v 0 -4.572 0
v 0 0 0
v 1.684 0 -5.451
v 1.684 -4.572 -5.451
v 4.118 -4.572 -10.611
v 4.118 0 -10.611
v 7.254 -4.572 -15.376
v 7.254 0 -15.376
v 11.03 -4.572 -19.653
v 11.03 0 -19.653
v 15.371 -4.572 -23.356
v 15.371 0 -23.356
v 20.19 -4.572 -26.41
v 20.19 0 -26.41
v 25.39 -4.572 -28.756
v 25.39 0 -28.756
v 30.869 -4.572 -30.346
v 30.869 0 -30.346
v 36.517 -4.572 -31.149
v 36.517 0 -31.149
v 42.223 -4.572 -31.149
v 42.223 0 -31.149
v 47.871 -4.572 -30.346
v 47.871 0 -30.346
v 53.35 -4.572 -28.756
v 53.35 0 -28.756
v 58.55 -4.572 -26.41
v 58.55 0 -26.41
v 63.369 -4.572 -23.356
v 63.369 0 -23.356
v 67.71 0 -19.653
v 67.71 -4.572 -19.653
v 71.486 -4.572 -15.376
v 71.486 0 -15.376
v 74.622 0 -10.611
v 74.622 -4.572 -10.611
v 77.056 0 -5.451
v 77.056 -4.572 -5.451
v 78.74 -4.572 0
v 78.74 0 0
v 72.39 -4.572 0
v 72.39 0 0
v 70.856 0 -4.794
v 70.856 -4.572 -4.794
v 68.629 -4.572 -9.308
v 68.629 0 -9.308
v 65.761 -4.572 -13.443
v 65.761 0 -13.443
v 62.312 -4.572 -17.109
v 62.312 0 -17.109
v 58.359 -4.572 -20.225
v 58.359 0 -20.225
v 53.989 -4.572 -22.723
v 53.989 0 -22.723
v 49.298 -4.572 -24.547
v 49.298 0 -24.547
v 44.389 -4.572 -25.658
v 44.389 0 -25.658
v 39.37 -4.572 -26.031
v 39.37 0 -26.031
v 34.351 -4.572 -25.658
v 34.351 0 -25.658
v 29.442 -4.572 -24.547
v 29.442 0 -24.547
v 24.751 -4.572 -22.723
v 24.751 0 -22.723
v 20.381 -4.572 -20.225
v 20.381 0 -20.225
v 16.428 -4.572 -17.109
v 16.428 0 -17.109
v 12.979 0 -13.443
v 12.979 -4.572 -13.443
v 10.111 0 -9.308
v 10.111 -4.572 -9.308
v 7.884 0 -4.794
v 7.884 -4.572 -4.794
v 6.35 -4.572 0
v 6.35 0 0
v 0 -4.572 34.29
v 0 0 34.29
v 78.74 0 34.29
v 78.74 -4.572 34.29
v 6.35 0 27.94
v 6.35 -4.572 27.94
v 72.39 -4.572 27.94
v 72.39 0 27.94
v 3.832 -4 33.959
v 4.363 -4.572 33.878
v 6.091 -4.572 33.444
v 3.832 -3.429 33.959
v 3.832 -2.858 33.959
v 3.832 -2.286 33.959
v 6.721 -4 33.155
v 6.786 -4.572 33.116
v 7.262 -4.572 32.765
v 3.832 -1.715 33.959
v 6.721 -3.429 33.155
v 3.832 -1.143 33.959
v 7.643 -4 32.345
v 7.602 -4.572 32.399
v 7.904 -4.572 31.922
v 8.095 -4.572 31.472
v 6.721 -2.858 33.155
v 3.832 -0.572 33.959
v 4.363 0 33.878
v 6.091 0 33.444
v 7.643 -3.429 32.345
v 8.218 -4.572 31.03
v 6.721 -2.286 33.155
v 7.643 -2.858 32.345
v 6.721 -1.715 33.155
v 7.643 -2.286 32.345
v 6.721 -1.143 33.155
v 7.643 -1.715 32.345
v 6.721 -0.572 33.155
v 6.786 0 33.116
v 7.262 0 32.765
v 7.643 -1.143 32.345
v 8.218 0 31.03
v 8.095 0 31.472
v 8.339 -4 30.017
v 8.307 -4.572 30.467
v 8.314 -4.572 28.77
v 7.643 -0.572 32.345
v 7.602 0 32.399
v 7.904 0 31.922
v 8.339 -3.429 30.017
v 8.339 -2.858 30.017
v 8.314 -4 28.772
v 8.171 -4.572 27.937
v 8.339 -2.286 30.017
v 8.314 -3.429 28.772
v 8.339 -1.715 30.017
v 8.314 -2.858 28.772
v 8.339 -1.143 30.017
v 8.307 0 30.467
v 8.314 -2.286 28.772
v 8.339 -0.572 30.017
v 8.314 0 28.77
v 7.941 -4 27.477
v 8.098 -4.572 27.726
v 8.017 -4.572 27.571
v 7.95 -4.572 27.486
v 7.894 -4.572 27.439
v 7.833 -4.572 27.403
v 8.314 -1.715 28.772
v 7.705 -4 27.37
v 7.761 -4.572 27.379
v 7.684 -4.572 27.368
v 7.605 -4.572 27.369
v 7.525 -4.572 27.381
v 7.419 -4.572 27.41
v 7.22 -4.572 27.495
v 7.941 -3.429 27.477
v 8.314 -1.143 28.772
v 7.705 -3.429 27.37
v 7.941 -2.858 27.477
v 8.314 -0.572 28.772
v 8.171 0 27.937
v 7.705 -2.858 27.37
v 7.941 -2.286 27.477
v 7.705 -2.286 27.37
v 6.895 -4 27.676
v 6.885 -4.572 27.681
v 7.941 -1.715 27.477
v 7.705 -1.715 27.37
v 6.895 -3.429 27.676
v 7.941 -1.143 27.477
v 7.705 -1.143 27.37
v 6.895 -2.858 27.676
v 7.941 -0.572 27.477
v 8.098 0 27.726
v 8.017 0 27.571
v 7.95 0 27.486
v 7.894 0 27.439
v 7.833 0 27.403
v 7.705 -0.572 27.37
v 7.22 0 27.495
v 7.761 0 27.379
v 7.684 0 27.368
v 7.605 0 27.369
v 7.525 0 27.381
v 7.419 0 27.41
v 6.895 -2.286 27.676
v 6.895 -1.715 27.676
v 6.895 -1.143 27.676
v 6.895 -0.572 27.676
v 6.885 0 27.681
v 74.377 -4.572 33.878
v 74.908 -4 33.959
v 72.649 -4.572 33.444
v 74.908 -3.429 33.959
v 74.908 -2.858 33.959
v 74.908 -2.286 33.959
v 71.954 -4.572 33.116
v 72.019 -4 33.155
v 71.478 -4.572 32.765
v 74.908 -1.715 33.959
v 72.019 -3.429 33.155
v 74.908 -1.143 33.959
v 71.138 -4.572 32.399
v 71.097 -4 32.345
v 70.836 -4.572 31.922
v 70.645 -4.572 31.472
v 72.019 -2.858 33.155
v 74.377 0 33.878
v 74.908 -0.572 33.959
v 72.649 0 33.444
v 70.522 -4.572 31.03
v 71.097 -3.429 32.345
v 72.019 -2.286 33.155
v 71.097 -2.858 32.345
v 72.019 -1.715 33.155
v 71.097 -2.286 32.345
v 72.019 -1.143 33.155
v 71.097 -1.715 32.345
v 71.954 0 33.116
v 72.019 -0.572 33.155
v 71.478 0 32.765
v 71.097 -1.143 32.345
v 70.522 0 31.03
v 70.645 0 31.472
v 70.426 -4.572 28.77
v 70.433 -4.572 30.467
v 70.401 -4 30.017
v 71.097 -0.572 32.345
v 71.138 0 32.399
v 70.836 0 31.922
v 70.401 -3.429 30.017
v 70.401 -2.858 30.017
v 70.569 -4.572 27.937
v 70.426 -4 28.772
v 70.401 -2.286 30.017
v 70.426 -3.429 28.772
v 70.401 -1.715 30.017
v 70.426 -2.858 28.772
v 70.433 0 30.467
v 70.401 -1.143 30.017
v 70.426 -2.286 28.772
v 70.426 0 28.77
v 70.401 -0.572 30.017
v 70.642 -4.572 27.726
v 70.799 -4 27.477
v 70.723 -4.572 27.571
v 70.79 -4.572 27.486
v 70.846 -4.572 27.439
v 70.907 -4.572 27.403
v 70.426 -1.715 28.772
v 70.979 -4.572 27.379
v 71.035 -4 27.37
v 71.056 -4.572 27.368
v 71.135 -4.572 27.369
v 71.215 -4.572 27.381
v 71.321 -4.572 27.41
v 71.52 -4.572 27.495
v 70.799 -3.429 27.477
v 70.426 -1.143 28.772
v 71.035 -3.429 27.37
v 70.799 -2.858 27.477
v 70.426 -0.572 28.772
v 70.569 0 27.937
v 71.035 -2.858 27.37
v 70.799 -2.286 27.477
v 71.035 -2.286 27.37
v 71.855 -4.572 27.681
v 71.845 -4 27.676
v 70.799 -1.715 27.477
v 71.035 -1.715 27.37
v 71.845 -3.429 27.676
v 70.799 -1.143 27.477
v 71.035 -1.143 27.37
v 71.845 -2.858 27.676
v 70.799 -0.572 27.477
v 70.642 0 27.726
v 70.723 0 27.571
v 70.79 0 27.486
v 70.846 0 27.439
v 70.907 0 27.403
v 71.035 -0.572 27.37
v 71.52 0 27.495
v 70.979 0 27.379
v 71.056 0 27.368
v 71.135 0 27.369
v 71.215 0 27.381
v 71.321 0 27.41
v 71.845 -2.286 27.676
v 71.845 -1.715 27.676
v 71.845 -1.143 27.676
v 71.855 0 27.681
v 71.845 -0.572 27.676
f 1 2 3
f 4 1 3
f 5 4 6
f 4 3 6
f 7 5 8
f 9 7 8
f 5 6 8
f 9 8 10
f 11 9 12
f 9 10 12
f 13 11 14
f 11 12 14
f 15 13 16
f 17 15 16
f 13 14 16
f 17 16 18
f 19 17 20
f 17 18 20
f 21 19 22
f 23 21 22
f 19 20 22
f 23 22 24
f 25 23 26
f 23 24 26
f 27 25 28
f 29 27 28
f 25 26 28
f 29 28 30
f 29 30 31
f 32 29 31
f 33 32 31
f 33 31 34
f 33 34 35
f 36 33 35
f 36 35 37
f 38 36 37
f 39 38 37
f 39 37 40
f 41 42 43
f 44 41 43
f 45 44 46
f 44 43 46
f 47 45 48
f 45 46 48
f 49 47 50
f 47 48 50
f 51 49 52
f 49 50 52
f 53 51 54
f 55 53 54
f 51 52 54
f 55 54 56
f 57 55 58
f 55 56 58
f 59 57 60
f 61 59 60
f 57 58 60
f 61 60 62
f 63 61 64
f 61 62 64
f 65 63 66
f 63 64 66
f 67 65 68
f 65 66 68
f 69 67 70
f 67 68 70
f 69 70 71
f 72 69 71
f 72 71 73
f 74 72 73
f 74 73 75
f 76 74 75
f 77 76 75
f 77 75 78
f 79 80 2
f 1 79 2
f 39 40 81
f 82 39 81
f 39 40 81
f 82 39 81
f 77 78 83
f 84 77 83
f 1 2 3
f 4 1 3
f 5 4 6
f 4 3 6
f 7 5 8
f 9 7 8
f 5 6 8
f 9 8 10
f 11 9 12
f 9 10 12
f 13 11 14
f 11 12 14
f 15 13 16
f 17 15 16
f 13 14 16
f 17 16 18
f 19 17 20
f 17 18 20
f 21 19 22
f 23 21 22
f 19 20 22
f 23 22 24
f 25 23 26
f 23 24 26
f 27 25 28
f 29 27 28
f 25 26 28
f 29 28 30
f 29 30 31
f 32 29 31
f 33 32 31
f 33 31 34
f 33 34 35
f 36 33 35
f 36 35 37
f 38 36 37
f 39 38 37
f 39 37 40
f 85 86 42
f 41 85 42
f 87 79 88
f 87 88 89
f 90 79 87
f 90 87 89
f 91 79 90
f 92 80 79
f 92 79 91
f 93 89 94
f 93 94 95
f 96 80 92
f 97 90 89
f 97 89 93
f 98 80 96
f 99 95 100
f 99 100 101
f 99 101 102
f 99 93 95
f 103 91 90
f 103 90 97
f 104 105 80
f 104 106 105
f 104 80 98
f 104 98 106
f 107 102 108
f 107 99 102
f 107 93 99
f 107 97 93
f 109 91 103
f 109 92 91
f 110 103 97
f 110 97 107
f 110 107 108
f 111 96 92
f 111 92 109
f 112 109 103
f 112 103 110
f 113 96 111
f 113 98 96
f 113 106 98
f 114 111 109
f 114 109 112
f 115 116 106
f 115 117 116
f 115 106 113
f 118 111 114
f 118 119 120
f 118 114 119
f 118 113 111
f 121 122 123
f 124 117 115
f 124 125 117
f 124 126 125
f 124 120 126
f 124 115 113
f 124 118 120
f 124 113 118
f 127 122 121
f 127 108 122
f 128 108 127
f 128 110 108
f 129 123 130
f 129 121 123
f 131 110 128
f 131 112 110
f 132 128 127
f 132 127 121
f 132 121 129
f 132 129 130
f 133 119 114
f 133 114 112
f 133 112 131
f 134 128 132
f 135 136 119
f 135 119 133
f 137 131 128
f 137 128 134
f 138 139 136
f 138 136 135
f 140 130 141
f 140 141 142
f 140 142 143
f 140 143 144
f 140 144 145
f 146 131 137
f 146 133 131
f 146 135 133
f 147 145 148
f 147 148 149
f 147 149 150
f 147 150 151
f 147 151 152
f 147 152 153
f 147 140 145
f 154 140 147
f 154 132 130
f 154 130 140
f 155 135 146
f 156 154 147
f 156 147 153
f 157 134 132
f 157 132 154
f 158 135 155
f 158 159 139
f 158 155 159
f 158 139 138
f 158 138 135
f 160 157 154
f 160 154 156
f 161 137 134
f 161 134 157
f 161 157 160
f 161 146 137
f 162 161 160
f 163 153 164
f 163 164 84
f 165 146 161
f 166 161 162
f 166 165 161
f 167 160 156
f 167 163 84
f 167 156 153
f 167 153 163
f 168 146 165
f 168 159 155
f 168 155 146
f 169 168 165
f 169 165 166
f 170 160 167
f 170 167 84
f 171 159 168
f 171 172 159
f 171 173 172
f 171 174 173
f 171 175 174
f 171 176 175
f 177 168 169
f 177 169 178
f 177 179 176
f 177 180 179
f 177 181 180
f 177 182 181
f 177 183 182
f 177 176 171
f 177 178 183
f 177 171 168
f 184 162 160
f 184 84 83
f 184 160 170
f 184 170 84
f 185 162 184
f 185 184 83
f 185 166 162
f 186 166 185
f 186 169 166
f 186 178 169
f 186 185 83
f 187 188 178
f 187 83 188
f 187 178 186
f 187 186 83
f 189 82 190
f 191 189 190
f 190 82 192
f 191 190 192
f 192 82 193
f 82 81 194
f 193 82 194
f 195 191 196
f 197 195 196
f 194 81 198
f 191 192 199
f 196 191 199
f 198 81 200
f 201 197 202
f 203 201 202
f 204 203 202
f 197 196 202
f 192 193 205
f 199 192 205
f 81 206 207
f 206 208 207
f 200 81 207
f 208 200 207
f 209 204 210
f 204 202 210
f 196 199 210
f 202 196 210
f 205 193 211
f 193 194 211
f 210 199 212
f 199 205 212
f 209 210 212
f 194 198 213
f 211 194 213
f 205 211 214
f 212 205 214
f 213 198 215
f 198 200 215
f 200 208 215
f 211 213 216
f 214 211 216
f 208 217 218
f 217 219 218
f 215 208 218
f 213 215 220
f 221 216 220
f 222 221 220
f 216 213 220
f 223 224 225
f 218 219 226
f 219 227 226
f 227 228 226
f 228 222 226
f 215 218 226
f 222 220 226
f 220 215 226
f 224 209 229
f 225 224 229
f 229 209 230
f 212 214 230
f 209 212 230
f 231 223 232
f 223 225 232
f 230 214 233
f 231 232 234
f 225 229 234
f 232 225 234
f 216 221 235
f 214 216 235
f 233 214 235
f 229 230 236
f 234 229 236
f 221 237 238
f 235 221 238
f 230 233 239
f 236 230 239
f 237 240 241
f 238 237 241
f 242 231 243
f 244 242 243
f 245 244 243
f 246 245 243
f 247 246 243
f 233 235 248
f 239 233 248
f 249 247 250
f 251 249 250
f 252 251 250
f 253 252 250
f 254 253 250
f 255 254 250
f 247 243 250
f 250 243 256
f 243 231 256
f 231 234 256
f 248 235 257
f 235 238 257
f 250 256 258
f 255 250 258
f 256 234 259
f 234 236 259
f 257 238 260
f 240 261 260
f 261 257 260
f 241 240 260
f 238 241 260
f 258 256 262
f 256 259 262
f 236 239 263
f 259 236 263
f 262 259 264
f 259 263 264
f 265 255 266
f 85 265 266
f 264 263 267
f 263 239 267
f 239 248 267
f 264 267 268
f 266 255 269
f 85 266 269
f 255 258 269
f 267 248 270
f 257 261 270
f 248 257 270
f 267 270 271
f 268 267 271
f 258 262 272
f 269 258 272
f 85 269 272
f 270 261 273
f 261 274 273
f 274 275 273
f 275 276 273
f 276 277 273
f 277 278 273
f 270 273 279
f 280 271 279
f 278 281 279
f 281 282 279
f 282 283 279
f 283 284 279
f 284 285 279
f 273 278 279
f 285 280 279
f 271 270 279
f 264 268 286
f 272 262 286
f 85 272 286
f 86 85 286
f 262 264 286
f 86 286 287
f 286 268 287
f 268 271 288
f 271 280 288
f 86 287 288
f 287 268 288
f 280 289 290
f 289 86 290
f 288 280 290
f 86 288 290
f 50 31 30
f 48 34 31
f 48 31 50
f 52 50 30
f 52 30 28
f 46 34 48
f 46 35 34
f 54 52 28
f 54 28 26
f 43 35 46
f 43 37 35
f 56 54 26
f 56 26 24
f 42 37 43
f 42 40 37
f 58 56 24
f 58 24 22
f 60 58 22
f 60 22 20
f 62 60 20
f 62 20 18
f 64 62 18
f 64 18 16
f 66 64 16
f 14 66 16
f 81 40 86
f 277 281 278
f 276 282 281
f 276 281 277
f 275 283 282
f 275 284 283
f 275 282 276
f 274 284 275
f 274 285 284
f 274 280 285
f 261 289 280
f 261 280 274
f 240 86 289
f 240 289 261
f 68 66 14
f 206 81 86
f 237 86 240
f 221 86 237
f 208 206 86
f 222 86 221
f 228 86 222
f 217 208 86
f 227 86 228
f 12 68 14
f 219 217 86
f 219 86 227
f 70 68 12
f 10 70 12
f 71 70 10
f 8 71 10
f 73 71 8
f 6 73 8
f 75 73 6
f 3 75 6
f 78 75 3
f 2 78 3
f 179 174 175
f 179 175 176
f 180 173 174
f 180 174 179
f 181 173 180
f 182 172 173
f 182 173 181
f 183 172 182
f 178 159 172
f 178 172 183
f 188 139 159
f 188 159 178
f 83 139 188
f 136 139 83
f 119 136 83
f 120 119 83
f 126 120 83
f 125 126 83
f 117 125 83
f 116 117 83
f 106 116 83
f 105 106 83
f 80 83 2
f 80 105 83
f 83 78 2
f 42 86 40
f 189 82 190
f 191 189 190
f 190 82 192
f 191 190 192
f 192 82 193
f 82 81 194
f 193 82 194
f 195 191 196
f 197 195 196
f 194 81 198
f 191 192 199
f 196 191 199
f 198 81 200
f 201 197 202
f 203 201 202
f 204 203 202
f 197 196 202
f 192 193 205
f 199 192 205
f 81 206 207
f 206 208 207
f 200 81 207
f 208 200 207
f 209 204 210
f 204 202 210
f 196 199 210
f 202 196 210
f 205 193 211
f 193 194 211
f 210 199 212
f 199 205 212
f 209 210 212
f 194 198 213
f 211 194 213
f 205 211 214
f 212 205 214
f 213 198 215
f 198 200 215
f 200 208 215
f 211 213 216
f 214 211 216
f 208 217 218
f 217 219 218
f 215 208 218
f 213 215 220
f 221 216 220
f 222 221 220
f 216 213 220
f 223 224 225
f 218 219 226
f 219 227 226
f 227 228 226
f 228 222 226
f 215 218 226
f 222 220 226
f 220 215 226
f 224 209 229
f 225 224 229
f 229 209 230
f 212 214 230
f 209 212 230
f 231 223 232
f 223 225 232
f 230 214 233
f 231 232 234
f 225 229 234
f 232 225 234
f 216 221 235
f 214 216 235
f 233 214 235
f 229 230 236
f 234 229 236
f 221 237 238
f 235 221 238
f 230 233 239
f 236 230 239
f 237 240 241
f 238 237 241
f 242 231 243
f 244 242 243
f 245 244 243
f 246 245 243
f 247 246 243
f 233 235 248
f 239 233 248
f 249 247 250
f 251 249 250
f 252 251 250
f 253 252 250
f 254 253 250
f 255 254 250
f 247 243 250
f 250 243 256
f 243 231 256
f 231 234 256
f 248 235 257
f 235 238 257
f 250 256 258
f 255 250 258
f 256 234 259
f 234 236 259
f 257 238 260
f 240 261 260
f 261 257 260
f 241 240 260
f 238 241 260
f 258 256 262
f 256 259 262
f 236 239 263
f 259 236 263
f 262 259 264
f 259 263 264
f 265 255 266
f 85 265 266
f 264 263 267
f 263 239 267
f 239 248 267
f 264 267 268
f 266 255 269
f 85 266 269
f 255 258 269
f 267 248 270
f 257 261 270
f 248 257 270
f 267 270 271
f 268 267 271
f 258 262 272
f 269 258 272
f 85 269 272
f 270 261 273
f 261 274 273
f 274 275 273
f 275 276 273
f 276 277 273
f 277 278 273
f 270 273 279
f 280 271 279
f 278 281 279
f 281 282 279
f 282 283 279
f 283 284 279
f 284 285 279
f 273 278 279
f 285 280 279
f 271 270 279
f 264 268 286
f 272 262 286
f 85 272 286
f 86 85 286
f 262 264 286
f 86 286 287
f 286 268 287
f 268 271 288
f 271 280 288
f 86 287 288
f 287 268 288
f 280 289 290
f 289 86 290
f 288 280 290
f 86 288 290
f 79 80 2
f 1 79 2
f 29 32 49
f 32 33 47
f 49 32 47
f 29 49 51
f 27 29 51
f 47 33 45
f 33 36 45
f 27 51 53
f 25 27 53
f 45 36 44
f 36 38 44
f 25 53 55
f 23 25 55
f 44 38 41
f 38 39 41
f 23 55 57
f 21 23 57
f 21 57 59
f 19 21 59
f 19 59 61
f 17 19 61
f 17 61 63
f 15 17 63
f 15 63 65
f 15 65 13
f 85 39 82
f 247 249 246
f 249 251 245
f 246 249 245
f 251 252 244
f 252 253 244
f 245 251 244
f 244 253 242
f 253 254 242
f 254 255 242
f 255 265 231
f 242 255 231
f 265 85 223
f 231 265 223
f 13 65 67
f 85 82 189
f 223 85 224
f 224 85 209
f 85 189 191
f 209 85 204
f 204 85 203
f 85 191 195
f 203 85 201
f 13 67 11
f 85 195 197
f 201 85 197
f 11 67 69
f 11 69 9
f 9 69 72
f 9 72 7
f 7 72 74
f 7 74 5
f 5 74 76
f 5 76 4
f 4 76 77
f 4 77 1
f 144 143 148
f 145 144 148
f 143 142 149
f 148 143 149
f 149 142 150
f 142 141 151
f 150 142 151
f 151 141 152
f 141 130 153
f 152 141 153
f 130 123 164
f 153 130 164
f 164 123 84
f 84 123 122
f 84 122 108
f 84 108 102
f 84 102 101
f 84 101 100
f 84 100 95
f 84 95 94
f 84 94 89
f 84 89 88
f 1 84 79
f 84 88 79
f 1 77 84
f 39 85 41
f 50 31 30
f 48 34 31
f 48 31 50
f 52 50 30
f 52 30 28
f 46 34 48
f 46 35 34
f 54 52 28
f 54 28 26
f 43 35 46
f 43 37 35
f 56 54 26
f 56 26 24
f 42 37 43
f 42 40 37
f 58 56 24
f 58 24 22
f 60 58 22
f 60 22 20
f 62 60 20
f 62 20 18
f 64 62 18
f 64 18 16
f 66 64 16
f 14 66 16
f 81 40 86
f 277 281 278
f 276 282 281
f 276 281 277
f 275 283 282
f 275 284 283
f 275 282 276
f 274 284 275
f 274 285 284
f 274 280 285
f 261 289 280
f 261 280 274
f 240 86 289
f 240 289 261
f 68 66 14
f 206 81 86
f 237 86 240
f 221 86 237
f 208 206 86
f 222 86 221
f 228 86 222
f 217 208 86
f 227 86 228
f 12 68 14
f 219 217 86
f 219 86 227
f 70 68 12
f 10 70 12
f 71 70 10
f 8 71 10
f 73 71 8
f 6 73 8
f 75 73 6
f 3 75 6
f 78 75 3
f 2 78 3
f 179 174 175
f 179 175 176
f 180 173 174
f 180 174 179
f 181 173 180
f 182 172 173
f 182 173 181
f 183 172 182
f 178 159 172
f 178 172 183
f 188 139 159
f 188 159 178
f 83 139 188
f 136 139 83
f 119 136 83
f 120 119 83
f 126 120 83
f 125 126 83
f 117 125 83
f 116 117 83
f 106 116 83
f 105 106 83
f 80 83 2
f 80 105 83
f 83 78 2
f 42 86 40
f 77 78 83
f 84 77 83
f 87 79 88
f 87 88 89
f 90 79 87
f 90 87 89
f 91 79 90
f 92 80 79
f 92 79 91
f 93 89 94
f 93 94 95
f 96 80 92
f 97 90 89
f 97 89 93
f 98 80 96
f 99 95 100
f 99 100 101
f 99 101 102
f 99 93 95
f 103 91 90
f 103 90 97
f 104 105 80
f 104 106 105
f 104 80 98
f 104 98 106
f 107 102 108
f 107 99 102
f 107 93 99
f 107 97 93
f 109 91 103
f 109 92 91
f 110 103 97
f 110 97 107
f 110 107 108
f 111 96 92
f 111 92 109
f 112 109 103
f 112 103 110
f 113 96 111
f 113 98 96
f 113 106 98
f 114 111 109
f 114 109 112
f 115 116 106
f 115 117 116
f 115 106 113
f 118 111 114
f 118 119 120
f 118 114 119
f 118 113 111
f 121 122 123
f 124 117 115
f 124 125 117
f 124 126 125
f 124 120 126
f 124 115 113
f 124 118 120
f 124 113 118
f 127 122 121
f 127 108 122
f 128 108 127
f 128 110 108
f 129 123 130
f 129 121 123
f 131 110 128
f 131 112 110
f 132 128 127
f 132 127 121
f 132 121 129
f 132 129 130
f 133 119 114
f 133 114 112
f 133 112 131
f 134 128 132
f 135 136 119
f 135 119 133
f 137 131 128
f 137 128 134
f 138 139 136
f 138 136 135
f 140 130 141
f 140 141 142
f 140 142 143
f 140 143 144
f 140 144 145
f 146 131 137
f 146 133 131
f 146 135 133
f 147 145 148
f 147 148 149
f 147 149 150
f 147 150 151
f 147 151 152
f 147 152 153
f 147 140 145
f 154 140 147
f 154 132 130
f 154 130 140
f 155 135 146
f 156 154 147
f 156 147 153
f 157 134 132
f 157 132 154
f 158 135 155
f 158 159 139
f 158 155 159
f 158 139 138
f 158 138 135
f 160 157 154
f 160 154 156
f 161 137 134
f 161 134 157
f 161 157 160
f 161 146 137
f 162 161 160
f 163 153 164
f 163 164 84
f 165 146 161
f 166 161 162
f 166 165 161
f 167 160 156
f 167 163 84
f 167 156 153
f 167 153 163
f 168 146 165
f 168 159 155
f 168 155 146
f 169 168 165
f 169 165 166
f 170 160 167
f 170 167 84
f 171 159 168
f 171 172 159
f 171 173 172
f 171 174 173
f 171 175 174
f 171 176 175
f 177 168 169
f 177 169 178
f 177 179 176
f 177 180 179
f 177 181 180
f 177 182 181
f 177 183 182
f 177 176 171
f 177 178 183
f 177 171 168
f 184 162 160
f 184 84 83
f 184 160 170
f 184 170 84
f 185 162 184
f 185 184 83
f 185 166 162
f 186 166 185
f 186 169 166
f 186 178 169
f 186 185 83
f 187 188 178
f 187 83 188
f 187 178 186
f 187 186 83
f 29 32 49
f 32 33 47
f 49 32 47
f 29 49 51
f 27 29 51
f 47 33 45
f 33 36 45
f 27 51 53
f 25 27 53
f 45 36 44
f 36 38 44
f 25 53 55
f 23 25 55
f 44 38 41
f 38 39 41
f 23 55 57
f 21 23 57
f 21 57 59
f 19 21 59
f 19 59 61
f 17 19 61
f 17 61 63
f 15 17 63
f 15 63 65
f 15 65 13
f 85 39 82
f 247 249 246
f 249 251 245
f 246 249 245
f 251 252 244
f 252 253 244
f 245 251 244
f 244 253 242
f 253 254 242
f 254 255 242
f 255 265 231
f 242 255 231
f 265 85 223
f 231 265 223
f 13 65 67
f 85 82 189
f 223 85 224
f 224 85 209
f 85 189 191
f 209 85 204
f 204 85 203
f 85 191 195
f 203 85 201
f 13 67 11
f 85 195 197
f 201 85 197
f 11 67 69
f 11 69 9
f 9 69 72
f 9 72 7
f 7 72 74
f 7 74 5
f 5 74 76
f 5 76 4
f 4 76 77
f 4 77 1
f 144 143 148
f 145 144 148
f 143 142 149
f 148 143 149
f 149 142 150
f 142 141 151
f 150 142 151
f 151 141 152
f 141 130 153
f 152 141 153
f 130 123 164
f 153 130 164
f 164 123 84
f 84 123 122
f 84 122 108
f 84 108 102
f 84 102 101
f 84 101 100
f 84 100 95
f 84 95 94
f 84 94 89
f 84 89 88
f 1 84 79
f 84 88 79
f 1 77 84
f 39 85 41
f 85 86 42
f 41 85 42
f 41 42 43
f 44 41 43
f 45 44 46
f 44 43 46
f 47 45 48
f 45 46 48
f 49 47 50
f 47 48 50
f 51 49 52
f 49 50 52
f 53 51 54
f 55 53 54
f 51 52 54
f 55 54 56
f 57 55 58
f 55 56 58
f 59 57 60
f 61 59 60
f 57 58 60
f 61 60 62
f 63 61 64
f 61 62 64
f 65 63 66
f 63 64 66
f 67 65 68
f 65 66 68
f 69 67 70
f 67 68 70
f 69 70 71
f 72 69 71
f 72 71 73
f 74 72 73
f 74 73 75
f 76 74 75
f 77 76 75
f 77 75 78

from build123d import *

# Parameters (mm, degrees)
F2_DEPTH = 4.572


with BuildPart() as f2:
    # F0 (on Front) → F2 (new body)
    with BuildSketch(Plane.XZ):
        with BuildLine():
            add(Edge.make_bspline(
                [(0, 34.29), (2.6595032543, 34.1218786327), (6.8410462273, 33.8575410271), (8.2231424457, 31.5056600227), (8.3576780587, 30.0085364948), (8.3617785553, 28.8524886525), (8.106687112, 27.3344007608), (7.4111867176, 27.3555041178), (6.8997891701, 27.6921221538), (6.5329051916, 27.8575353983), (6.35, 27.94)],
                knots=[0, 0, 0, 0, 0.2653006447, 0.4171328029, 0.5379049919, 0.6513099628, 0.7692832851, 0.8413997949, 0.9209319496, 1, 1, 1, 1], degree=3))
            Line((0, 34.29), (0, 0))
            ThreePointArc((0, 0), (39.37, -31.2501201344), (78.74, 0))
            Line((78.74, 0), (78.74, 34.29))
            add(Edge.make_bspline(
                [(78.74, 34.29), (76.0804967457, 34.1218786327), (71.8989537727, 33.8575410271), (70.5168575543, 31.5056600227), (70.3823219413, 30.0085364948), (70.3782214447, 28.8524886525), (70.633312888, 27.3344007608), (71.3288132824, 27.3555041178), (71.8402108299, 27.6921221538), (72.2070948084, 27.8575353983), (72.39, 27.94)],
                knots=[0, 0, 0, 0, 0.2653006447, 0.4171328029, 0.5379049919, 0.6513099628, 0.7692832851, 0.8413997949, 0.9209319496, 1, 1, 1, 1], degree=3))
            Line((72.39, 27.94), (72.39, 0))
            ThreePointArc((72.39, 0), (39.37, -26.0308788459), (6.35, 0))
            Line((6.35, 0), (6.35, 27.94))
        make_face()
    extrude(amount=F2_DEPTH)


with BuildPart() as f2b:
    # F1 (on face) → F2, piece 2 (new body)
    with BuildSketch(Plane.XZ):
        with BuildLine():
            add(Edge.make_bspline(
                [(0, 34.29), (2.6595032543, 34.1218786327), (6.8410462273, 33.8575410271), (8.2231424457, 31.5056600227), (8.3576780587, 30.0085364948), (8.3617785553, 28.8524886525), (8.106687112, 27.3344007608), (7.4111867176, 27.3555041178), (6.8997891701, 27.6921221538), (6.5329051916, 27.8575353983), (6.35, 27.94)],
                knots=[0, 0, 0, 0, 0.2653006447, 0.4171328029, 0.5379049919, 0.6513099628, 0.7692832851, 0.8413997949, 0.9209319496, 1, 1, 1, 1], degree=3))
            Line((0, 34.29), (0, 0))
            ThreePointArc((0, 0), (39.37, -31.2501201344), (78.74, 0))
            Line((78.74, 0), (78.74, 34.29))
            add(Edge.make_bspline(
                [(78.74, 34.29), (76.0804967457, 34.1218786327), (71.8989537727, 33.8575410271), (70.5168575543, 31.5056600227), (70.3823219413, 30.0085364948), (70.3782214447, 28.8524886525), (70.633312888, 27.3344007608), (71.3288132824, 27.3555041178), (71.8402108299, 27.6921221538), (72.2070948084, 27.8575353983), (72.39, 27.94)],
                knots=[0, 0, 0, 0, 0.2653006447, 0.4171328029, 0.5379049919, 0.6513099628, 0.7692832851, 0.8413997949, 0.9209319496, 1, 1, 1, 1], degree=3))
            Line((72.39, 27.94), (72.39, 0))
            ThreePointArc((72.39, 0), (39.37, -26.0308788459), (6.35, 0))
            Line((6.35, 0), (6.35, 27.94))
        make_face()
    extrude(amount=F2_DEPTH)


solid = Compound([f2.part, f2b.part])
